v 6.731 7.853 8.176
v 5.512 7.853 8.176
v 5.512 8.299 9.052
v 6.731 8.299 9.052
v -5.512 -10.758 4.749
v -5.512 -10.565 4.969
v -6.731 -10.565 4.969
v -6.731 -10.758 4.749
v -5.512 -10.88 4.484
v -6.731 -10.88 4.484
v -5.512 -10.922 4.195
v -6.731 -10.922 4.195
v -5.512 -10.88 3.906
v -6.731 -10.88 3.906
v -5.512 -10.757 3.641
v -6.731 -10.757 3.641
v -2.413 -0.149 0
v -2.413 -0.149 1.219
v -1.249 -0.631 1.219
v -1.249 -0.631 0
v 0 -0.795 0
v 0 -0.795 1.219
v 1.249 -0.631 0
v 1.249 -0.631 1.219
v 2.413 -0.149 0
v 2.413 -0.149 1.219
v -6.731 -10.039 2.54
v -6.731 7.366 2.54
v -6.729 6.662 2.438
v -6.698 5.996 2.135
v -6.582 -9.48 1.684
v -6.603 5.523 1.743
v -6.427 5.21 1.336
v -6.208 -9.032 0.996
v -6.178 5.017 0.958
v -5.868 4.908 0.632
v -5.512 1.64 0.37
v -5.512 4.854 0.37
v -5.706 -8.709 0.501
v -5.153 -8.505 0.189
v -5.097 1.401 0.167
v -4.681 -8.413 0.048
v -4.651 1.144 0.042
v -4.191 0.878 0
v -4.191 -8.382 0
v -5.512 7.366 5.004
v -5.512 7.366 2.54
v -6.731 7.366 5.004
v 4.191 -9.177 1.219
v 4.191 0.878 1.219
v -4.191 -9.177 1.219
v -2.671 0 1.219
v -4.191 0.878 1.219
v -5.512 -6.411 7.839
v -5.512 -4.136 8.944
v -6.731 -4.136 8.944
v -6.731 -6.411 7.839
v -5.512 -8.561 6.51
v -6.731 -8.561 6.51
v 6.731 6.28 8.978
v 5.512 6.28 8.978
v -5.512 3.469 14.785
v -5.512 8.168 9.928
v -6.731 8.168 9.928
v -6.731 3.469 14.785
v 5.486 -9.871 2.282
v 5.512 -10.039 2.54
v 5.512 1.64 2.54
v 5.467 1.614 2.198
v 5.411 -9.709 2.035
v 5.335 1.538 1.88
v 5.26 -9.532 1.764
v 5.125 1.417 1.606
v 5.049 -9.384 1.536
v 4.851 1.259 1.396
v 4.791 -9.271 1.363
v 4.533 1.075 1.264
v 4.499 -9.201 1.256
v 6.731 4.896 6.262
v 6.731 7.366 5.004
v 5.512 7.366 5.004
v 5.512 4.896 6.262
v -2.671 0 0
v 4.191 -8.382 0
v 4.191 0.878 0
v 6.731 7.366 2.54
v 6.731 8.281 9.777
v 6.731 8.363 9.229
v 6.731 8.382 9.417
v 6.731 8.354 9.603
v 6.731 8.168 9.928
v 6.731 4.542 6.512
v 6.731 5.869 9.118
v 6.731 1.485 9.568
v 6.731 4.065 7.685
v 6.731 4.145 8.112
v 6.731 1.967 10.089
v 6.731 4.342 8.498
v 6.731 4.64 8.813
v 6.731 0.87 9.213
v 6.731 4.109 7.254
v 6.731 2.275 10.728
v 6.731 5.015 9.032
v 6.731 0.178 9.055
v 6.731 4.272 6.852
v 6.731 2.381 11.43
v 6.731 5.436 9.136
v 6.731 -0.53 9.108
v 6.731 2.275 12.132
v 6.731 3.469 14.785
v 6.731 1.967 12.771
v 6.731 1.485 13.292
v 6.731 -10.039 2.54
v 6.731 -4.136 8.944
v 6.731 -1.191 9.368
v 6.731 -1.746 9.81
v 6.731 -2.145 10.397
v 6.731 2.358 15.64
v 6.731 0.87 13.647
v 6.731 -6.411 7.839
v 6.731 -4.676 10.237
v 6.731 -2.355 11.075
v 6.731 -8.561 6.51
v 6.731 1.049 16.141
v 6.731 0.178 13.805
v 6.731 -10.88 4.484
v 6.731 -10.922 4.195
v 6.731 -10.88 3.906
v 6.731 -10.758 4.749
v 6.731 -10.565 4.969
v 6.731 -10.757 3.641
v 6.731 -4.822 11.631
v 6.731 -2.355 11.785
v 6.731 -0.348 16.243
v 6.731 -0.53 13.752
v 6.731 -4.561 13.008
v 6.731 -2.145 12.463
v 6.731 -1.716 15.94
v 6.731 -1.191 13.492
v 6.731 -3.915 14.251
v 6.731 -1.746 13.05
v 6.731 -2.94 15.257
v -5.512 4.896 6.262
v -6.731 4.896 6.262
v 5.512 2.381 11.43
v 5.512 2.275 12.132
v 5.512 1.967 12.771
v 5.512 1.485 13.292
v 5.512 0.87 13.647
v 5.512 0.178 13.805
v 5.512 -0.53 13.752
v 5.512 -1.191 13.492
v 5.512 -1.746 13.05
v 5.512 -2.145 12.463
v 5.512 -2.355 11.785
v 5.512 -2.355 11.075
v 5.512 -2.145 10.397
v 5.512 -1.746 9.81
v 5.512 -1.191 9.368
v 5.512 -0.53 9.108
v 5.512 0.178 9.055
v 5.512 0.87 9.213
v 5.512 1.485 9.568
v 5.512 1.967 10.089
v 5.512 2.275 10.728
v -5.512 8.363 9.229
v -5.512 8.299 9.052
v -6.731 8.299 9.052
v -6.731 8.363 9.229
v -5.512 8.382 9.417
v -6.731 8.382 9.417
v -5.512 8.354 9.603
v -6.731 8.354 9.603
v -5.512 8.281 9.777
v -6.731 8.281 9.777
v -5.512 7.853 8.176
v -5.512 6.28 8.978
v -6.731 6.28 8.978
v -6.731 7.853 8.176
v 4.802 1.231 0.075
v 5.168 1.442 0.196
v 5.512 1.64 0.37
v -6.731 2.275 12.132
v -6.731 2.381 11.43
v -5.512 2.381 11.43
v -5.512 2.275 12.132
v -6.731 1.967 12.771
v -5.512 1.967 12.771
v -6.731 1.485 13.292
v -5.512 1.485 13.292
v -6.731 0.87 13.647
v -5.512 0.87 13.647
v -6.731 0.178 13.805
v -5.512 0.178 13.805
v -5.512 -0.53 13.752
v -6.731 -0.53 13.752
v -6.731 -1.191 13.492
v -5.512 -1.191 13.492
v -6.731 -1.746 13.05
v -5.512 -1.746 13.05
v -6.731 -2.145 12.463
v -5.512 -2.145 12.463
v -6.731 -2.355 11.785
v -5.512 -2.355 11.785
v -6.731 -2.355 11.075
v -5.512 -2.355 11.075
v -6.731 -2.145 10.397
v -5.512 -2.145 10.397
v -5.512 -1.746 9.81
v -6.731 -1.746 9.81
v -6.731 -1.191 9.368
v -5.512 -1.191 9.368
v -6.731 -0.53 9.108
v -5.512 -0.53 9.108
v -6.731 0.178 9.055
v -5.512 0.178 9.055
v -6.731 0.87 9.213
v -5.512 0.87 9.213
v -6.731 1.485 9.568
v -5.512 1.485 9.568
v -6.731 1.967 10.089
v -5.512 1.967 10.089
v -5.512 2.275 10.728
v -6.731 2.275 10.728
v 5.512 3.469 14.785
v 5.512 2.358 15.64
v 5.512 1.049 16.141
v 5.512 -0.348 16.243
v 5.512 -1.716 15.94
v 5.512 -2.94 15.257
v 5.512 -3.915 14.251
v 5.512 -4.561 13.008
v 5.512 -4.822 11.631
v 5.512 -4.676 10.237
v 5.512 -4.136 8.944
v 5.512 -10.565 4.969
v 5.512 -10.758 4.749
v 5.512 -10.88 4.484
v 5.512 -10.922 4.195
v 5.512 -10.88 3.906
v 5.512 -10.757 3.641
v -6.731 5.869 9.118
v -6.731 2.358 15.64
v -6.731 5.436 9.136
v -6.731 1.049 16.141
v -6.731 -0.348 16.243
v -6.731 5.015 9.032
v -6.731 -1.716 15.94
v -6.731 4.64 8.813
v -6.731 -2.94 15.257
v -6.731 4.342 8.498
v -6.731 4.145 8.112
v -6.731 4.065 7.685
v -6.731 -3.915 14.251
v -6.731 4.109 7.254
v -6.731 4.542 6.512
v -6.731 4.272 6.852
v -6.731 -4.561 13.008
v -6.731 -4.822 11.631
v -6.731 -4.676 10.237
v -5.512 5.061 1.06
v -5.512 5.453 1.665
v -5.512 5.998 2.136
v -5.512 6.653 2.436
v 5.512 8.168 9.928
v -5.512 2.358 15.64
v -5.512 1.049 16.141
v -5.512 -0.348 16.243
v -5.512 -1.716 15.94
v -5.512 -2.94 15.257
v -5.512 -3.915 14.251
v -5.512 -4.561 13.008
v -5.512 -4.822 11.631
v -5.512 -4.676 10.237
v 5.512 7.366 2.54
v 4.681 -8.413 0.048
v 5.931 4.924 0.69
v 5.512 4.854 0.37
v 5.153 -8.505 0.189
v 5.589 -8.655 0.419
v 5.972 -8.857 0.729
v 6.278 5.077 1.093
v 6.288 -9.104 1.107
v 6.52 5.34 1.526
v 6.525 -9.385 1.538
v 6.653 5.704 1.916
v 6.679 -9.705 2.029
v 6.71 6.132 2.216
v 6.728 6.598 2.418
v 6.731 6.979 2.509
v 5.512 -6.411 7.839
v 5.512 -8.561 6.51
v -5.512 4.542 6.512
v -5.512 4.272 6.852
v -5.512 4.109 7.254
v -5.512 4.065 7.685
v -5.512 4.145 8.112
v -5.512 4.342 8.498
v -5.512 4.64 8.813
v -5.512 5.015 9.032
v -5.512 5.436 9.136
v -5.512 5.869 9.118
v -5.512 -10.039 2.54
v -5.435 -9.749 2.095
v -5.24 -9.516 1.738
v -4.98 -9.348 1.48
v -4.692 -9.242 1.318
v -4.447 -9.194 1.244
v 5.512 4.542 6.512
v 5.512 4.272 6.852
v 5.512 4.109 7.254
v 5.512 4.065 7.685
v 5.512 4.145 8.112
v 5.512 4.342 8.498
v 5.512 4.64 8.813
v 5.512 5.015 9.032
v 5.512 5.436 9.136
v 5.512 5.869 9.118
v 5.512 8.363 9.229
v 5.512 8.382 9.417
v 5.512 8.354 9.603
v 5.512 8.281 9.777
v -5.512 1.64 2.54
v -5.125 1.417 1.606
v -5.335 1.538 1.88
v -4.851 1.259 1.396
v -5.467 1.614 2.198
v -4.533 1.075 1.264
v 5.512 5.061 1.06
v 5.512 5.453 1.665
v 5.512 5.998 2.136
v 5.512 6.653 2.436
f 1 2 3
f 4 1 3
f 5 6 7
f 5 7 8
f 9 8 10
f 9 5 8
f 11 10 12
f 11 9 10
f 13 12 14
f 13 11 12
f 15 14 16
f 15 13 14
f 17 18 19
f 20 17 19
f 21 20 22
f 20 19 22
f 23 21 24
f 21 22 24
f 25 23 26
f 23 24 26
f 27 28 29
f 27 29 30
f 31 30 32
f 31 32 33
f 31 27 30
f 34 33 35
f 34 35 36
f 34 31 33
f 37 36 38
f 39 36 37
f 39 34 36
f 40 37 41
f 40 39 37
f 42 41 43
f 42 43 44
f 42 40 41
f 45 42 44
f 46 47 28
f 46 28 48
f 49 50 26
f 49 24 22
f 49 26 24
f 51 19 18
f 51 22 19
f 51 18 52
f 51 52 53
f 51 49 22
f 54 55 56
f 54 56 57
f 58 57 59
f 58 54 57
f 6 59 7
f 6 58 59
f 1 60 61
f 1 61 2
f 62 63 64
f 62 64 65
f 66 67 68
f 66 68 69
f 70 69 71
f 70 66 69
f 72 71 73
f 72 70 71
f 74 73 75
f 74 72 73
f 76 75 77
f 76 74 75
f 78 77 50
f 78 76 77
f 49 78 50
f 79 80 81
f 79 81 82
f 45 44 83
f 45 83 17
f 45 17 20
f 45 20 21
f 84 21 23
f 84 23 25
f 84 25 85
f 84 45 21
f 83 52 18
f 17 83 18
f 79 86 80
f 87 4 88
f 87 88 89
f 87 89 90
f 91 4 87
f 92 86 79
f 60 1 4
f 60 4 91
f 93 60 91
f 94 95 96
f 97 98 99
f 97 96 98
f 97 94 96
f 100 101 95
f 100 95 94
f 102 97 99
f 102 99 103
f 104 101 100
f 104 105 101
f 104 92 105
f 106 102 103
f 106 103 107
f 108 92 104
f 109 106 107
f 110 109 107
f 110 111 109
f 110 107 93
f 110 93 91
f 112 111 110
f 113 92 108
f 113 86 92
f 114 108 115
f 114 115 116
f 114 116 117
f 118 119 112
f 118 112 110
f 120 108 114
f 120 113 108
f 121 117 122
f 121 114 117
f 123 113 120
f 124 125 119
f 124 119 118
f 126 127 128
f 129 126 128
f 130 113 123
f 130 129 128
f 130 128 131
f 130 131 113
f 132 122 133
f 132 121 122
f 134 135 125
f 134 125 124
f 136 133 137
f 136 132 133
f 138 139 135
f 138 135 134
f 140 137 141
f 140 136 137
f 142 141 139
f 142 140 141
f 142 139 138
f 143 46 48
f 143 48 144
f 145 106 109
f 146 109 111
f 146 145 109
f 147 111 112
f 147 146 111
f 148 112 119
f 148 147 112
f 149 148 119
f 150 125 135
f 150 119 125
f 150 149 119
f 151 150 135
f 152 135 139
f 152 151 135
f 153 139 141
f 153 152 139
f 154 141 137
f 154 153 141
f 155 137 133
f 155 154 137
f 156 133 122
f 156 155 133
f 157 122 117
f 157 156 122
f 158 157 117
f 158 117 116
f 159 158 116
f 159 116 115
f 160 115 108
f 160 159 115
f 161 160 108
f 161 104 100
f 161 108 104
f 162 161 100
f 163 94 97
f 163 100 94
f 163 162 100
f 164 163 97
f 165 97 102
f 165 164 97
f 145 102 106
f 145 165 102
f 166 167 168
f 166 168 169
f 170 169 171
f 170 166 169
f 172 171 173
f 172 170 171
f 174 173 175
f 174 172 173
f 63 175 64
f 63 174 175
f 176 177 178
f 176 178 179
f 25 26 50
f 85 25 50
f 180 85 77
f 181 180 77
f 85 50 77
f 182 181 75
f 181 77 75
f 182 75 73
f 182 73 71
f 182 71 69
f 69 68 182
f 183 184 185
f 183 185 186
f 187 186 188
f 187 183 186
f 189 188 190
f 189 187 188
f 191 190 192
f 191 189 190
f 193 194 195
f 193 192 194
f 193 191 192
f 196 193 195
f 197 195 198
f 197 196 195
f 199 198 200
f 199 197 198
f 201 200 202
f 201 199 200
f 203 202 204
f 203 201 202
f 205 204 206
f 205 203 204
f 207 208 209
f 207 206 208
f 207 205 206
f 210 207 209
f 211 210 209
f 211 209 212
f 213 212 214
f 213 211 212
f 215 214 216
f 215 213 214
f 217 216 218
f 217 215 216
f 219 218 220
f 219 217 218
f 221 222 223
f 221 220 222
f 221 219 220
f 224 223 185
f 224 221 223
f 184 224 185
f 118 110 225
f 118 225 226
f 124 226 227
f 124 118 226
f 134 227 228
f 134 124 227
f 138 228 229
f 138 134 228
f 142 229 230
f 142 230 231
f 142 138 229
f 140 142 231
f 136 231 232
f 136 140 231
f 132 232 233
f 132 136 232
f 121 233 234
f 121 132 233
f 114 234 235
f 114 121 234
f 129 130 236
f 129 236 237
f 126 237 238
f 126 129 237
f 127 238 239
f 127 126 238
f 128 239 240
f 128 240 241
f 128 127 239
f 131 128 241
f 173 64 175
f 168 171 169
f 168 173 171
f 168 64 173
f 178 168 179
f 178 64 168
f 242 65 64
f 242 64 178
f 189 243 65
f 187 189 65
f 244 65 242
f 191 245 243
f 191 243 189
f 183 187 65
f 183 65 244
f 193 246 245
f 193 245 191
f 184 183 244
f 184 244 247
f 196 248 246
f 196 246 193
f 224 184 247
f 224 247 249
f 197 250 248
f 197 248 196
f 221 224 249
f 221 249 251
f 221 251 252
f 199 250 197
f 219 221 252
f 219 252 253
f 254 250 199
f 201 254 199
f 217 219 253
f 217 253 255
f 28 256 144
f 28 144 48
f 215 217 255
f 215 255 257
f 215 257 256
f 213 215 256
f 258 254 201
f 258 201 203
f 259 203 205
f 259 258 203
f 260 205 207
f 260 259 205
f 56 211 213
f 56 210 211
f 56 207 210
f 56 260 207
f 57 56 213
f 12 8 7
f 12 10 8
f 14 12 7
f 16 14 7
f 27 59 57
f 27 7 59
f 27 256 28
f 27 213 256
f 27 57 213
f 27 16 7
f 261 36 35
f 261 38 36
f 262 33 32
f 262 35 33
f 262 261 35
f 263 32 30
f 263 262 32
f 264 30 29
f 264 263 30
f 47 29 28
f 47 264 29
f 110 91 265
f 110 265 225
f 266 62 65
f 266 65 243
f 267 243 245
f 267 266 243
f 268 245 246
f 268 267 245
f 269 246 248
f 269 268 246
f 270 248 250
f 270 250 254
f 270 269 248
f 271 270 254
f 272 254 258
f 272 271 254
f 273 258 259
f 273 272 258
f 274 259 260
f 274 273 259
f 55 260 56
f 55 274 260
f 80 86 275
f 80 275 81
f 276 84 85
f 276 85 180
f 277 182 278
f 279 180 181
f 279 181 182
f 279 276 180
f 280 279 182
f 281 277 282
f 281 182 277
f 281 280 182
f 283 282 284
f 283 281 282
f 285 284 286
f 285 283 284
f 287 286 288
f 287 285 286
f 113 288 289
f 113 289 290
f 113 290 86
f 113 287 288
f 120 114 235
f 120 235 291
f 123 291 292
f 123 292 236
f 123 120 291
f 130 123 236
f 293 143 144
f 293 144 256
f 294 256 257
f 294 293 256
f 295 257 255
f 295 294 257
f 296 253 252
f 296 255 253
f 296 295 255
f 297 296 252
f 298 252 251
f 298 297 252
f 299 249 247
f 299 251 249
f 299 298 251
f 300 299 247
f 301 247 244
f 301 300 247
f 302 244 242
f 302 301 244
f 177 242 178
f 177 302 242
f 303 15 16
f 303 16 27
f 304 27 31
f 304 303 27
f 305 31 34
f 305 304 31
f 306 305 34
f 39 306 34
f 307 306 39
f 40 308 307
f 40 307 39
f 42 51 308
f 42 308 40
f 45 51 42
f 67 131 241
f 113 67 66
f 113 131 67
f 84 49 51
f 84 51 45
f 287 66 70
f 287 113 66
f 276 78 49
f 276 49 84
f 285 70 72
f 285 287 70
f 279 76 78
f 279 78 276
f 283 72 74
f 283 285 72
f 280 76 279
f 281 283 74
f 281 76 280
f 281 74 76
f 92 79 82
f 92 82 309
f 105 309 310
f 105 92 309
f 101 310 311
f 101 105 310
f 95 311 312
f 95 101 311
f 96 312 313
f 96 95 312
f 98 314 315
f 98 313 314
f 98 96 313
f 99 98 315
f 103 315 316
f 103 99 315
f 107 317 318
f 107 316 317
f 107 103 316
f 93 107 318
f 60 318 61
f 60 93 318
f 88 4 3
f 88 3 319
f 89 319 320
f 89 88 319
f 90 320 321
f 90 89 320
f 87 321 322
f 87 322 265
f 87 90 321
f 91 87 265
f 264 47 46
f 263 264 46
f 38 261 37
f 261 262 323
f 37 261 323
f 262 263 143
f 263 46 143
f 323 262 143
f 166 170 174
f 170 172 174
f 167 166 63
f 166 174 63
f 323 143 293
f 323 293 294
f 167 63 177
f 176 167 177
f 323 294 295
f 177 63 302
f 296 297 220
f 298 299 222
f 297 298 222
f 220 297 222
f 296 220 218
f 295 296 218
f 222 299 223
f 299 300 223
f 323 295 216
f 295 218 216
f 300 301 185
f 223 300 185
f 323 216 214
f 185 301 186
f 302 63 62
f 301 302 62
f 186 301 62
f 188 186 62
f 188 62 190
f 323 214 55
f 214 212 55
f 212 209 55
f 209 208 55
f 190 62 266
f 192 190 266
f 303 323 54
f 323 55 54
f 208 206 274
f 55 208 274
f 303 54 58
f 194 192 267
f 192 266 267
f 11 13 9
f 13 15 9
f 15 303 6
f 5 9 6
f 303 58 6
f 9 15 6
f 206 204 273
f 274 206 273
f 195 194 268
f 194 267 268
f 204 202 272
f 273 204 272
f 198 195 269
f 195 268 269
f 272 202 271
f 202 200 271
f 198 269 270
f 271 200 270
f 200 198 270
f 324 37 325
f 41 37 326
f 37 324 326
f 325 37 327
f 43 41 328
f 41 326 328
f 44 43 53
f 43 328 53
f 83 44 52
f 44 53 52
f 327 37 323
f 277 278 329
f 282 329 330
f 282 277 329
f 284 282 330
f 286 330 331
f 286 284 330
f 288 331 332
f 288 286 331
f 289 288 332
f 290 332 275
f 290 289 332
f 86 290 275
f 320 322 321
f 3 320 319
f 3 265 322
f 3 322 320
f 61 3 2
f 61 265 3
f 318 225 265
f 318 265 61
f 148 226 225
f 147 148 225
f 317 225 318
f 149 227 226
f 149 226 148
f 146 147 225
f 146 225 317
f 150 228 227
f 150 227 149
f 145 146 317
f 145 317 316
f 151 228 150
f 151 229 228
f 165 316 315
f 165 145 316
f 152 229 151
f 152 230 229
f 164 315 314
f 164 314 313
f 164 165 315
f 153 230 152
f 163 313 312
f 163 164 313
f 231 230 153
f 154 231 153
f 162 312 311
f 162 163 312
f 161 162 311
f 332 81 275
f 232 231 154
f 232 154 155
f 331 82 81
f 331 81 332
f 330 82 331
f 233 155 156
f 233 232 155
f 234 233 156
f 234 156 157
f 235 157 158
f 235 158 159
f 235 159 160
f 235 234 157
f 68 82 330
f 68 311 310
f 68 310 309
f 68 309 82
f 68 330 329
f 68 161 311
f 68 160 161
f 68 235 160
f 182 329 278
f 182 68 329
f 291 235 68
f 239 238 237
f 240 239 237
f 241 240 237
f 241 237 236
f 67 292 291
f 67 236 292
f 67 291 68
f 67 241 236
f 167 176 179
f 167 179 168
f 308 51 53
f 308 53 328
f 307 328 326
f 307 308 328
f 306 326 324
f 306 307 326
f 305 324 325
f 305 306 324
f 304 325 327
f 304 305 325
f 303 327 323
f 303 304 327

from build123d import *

# Parameters (mm, degrees)
F1_DEPTH = 12.7
F2_R     = 2.38125
F3_DEPTH = 25.4
F5_DEPTH = 12.7


with BuildPart() as f1:
    # F0 (on Front) → F1 (new body, symmetric)
    with BuildSketch(Plane.XZ):
        with BuildLine():
            ThreePointArc((-6.731, 2.54), (-5.987051, 0.743949), (-4.191, 0))
            Line((-4.191, 0), (4.191, 0))
            ThreePointArc((4.191, 0), (5.987051, 0.743949), (6.731, 2.54))
            Line((6.731, 2.54), (6.731, 25.4))
            Line((6.731, 25.4), (5.5118, 25.4))
            Line((5.5118, 25.4), (5.5118, 2.54))
            ThreePointArc((5.5118, 2.54), (5.124947, 1.606053), (4.191, 1.2192))
            Line((4.191, 1.2192), (-4.191, 1.2192))
            ThreePointArc((-4.191, 1.2192), (-5.124947, 1.606053), (-5.5118, 2.54))
            Line((-5.5118, 2.54), (-5.5118, 25.4))
            Line((-5.5118, 25.4), (-6.731, 25.4))
            Line((-6.731, 25.4), (-6.731, 2.54))
        make_face()
    extrude(amount=F1_DEPTH, both=True)

    # F2 (on Right) → F3 (intersect, symmetric)
    with BuildSketch(Plane.YZ):
        with BuildLine():
            Line((-10.756956, 3.640789), (-8.382, 0))
            Line((-8.382, 0), (4.826, 0))
            ThreePointArc((4.826, 0), (5.572779, 1.793221), (7.366, 2.54))
            Line((7.366, 2.54), (7.366, 5.003639))
            Line((7.366, 5.003639), (4.896118, 6.262106))
            ThreePointArc((4.896118, 6.262106), (4.230106, 8.311882), (6.279882, 8.977894))
            Line((6.279882, 8.977894), (7.852802, 8.176451))
            Line((7.852802, 8.176451), (8.298947, 9.052059))
            ThreePointArc((8.298947, 9.052059), (8.373581, 9.510956), (8.167681, 9.927802))
            Line((8.167681, 9.927802), (3.468643, 14.785412))
            ThreePointArc((3.468643, 14.785412), (-2.939764, 15.257279), (-4.136388, 8.943925))
            ThreePointArc((-4.136388, 8.943925), (-7.502613, 7.201857), (-10.565319, 4.9689))
            ThreePointArc((-10.565319, 4.9689), (-10.911586, 4.340983), (-10.756956, 3.640789))
        make_face()
        with Locations((0, 11.43)):
            Circle(F2_R, mode=Mode.SUBTRACT)
    extrude(amount=F3_DEPTH, both=True, mode=Mode.INTERSECT)

    # F4 (on Top) → F5 (cut, symmetric)
    with BuildSketch(Plane.XY):
        with BuildLine():
            Line((-5.5118, 3.468643), (-5.5118, 1.640347))
            Line((-5.5118, 1.640347), (-2.670635, 0))
            Line((-2.670635, 0), (-2.413, -0.148746))
            ThreePointArc((-2.413, -0.148746), (0, -0.795307), (2.413, -0.148746))
            Line((2.413, -0.148746), (5.5118, 1.640347))
            Line((5.5118, 1.640347), (5.5118, 3.468643))
            Line((5.5118, 3.468643), (5.5118, 11.050733))
            Line((5.5118, 11.050733), (-5.5118, 11.050733))
            Line((-5.5118, 11.050733), (-5.5118, 3.468643))
        make_face()
    extrude(amount=F5_DEPTH, both=True, mode=Mode.SUBTRACT)


solid = f1.part
